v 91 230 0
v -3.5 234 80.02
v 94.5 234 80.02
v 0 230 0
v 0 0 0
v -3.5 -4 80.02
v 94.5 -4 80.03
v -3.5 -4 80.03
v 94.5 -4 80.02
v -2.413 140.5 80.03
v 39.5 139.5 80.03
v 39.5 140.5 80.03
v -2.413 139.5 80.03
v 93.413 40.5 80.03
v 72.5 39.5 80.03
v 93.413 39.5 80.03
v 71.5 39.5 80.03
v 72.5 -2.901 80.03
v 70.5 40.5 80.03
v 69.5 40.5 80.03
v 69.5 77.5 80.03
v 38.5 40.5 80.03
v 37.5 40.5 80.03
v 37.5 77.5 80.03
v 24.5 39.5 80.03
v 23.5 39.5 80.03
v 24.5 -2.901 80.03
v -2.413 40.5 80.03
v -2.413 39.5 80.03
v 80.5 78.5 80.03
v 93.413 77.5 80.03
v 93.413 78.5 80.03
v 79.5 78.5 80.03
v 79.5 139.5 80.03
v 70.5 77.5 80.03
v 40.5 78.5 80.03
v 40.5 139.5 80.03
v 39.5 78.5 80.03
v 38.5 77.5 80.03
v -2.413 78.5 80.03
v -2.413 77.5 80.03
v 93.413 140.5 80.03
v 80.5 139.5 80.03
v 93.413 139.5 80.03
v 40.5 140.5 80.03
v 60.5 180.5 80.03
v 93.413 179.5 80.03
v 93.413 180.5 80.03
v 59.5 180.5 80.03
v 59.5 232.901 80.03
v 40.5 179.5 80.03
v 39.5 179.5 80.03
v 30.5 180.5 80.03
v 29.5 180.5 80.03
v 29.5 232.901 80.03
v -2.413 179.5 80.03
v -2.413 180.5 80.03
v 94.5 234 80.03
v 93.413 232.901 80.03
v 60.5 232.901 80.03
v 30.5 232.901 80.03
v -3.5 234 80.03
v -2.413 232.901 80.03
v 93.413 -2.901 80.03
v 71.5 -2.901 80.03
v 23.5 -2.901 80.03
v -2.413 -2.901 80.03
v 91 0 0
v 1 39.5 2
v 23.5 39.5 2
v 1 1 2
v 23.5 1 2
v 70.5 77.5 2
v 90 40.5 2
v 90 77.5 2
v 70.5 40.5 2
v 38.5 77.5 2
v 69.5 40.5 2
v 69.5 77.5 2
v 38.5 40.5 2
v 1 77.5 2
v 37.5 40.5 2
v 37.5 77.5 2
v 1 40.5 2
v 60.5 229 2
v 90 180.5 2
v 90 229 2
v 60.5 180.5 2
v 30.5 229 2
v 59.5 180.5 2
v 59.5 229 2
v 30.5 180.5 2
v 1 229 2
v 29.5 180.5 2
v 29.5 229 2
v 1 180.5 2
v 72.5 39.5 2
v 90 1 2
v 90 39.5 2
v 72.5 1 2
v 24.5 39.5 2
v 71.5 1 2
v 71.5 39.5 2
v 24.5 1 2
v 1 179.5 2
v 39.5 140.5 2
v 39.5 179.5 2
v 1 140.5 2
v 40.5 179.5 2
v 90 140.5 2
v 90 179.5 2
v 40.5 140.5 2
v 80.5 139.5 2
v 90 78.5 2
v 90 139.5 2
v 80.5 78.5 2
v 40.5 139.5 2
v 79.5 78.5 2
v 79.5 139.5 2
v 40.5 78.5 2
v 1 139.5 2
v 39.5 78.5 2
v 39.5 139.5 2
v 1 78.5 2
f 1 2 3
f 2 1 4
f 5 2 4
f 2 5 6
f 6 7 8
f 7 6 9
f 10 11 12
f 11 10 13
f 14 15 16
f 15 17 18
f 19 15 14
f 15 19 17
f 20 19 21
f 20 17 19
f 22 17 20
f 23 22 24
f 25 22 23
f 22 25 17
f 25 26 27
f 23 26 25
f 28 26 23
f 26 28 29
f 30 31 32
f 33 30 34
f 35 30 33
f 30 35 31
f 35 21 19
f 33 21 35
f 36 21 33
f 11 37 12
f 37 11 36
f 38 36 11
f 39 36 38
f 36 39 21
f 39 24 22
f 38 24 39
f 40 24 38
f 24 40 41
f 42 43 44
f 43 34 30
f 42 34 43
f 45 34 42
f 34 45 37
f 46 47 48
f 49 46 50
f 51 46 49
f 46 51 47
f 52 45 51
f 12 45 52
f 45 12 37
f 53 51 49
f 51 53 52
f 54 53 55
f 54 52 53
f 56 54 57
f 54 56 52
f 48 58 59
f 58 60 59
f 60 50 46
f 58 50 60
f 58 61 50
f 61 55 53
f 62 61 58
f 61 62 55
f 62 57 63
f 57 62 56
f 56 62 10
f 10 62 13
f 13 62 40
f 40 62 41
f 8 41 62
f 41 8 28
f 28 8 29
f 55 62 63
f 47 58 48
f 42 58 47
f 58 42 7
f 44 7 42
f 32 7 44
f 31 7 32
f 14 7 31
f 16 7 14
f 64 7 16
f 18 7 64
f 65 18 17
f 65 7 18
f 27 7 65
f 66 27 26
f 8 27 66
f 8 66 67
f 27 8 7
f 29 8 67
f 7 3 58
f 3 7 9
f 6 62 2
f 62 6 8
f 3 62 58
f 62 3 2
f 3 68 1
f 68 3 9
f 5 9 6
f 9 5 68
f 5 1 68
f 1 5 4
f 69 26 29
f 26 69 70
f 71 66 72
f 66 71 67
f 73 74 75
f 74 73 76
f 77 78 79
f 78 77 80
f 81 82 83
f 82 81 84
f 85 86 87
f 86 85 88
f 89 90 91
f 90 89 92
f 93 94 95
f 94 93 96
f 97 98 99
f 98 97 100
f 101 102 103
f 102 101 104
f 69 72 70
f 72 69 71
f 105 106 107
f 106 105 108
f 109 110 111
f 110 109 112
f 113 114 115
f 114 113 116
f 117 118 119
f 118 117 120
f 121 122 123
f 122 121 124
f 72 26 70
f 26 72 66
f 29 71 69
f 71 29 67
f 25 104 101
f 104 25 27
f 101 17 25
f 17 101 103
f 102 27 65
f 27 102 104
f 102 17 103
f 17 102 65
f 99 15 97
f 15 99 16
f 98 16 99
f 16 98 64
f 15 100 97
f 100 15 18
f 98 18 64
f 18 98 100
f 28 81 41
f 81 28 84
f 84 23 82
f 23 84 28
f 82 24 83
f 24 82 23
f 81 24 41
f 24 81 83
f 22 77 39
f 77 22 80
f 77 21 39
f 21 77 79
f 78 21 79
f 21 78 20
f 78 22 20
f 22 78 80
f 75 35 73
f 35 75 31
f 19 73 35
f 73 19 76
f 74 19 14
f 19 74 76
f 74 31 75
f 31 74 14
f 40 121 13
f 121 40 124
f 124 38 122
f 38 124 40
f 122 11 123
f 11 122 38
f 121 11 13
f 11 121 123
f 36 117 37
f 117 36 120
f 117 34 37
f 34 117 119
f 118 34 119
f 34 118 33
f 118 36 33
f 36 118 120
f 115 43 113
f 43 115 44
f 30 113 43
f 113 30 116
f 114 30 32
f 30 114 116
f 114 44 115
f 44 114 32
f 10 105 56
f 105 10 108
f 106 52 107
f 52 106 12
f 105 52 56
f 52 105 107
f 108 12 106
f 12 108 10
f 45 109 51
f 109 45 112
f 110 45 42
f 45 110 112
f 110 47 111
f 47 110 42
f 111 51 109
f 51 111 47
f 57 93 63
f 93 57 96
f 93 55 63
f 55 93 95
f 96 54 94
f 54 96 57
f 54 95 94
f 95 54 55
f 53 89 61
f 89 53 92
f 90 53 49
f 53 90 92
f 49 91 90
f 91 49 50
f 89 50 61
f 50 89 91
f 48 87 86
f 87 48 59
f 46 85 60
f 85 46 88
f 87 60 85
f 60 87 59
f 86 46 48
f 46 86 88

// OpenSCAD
// file: caddy_organizer_divider_common.scad
overlap=0.01;

/*
 * separate h,w for top and bottom defines the taper
 * centering defines whether the extra on top or bottom extends fully in the positive direction,
 * or extends equally in both directions.
 * flip***Wise shifts the larger end (top or bottom) in the negative direction so it
 * doesn't need to be mirrored & shifted externally.
 * clipBottomHeight cuts off the lower part of the box up to the height specified
 */
module taperedBox(bw, tw, bl, tl, ht, centerWidthwise=true, centerLengthwise=true, 
        flipWidthwise=false, flipLengthwise=false,
        clipBottomHeight=0) {
    extraWidth = abs(tw-bw);
    extraLength = abs(tl-bl);
    widerWidth = max(tw,bw);
    longerLength = max(tl,bl);
    // Don't shift if not centered or flipped.  When not centered and flipped, shift negative direction
    topWidthShift = ((centerWidthwise) ? -(extraWidth/2) : ((flipWidthwise) ? -extraWidth : 0));
    topLengthShift = ((centerLengthwise) ? -(extraLength/2) : ((flipLengthwise) ? -extraLength : 0));
    echo(str("topWidthShift=",topWidthShift,", topLengthShift=",topLengthShift));
    difference() {
        hull() {
            translate([0,0,0]) 
                cube([bw,bl,overlap]);
            translate([topWidthShift,topLengthShift,ht+overlap])
                cube([tw,tl,overlap]);
        }
        // clip off the bottom of the box (when used as a shallow cutout)        
        translate([-widerWidth/2,-longerLength,-overlap])
            cube([widerWidth*2,longerLength*2,clipBottomHeight+overlap]);
    }
}
// main file
use <caddy_organizer_divider.scad>

// For one of the clear utility boxes from Walmart
// Reminder: widths were adjusted after printing.  re-render before printing again
bottomWidth=91;
topWidth=98;
wallHeight=80;
crosswaysDividerOffsets=[0,40,78,140,180];  // last one cuts the remainder to outerLength
lengthwiseSplits=[
    [0,24,72],[0,38,70],[0,40,80],[0,40],[0,30,60]]; // same count as divider offsets - relative to bottomWidth
bottomLength=230;
topLength=238;

caddyOrganizerDivider(bottomWidth=bottomWidth, topWidth=topWidth, bottomLength=bottomLength, 
    topLength=topLength, wallHeight=wallHeight,crosswaysDividerOffsets=crosswaysDividerOffsets,
    lengthwiseSplits=lengthwiseSplits,allFullDepth=true);
